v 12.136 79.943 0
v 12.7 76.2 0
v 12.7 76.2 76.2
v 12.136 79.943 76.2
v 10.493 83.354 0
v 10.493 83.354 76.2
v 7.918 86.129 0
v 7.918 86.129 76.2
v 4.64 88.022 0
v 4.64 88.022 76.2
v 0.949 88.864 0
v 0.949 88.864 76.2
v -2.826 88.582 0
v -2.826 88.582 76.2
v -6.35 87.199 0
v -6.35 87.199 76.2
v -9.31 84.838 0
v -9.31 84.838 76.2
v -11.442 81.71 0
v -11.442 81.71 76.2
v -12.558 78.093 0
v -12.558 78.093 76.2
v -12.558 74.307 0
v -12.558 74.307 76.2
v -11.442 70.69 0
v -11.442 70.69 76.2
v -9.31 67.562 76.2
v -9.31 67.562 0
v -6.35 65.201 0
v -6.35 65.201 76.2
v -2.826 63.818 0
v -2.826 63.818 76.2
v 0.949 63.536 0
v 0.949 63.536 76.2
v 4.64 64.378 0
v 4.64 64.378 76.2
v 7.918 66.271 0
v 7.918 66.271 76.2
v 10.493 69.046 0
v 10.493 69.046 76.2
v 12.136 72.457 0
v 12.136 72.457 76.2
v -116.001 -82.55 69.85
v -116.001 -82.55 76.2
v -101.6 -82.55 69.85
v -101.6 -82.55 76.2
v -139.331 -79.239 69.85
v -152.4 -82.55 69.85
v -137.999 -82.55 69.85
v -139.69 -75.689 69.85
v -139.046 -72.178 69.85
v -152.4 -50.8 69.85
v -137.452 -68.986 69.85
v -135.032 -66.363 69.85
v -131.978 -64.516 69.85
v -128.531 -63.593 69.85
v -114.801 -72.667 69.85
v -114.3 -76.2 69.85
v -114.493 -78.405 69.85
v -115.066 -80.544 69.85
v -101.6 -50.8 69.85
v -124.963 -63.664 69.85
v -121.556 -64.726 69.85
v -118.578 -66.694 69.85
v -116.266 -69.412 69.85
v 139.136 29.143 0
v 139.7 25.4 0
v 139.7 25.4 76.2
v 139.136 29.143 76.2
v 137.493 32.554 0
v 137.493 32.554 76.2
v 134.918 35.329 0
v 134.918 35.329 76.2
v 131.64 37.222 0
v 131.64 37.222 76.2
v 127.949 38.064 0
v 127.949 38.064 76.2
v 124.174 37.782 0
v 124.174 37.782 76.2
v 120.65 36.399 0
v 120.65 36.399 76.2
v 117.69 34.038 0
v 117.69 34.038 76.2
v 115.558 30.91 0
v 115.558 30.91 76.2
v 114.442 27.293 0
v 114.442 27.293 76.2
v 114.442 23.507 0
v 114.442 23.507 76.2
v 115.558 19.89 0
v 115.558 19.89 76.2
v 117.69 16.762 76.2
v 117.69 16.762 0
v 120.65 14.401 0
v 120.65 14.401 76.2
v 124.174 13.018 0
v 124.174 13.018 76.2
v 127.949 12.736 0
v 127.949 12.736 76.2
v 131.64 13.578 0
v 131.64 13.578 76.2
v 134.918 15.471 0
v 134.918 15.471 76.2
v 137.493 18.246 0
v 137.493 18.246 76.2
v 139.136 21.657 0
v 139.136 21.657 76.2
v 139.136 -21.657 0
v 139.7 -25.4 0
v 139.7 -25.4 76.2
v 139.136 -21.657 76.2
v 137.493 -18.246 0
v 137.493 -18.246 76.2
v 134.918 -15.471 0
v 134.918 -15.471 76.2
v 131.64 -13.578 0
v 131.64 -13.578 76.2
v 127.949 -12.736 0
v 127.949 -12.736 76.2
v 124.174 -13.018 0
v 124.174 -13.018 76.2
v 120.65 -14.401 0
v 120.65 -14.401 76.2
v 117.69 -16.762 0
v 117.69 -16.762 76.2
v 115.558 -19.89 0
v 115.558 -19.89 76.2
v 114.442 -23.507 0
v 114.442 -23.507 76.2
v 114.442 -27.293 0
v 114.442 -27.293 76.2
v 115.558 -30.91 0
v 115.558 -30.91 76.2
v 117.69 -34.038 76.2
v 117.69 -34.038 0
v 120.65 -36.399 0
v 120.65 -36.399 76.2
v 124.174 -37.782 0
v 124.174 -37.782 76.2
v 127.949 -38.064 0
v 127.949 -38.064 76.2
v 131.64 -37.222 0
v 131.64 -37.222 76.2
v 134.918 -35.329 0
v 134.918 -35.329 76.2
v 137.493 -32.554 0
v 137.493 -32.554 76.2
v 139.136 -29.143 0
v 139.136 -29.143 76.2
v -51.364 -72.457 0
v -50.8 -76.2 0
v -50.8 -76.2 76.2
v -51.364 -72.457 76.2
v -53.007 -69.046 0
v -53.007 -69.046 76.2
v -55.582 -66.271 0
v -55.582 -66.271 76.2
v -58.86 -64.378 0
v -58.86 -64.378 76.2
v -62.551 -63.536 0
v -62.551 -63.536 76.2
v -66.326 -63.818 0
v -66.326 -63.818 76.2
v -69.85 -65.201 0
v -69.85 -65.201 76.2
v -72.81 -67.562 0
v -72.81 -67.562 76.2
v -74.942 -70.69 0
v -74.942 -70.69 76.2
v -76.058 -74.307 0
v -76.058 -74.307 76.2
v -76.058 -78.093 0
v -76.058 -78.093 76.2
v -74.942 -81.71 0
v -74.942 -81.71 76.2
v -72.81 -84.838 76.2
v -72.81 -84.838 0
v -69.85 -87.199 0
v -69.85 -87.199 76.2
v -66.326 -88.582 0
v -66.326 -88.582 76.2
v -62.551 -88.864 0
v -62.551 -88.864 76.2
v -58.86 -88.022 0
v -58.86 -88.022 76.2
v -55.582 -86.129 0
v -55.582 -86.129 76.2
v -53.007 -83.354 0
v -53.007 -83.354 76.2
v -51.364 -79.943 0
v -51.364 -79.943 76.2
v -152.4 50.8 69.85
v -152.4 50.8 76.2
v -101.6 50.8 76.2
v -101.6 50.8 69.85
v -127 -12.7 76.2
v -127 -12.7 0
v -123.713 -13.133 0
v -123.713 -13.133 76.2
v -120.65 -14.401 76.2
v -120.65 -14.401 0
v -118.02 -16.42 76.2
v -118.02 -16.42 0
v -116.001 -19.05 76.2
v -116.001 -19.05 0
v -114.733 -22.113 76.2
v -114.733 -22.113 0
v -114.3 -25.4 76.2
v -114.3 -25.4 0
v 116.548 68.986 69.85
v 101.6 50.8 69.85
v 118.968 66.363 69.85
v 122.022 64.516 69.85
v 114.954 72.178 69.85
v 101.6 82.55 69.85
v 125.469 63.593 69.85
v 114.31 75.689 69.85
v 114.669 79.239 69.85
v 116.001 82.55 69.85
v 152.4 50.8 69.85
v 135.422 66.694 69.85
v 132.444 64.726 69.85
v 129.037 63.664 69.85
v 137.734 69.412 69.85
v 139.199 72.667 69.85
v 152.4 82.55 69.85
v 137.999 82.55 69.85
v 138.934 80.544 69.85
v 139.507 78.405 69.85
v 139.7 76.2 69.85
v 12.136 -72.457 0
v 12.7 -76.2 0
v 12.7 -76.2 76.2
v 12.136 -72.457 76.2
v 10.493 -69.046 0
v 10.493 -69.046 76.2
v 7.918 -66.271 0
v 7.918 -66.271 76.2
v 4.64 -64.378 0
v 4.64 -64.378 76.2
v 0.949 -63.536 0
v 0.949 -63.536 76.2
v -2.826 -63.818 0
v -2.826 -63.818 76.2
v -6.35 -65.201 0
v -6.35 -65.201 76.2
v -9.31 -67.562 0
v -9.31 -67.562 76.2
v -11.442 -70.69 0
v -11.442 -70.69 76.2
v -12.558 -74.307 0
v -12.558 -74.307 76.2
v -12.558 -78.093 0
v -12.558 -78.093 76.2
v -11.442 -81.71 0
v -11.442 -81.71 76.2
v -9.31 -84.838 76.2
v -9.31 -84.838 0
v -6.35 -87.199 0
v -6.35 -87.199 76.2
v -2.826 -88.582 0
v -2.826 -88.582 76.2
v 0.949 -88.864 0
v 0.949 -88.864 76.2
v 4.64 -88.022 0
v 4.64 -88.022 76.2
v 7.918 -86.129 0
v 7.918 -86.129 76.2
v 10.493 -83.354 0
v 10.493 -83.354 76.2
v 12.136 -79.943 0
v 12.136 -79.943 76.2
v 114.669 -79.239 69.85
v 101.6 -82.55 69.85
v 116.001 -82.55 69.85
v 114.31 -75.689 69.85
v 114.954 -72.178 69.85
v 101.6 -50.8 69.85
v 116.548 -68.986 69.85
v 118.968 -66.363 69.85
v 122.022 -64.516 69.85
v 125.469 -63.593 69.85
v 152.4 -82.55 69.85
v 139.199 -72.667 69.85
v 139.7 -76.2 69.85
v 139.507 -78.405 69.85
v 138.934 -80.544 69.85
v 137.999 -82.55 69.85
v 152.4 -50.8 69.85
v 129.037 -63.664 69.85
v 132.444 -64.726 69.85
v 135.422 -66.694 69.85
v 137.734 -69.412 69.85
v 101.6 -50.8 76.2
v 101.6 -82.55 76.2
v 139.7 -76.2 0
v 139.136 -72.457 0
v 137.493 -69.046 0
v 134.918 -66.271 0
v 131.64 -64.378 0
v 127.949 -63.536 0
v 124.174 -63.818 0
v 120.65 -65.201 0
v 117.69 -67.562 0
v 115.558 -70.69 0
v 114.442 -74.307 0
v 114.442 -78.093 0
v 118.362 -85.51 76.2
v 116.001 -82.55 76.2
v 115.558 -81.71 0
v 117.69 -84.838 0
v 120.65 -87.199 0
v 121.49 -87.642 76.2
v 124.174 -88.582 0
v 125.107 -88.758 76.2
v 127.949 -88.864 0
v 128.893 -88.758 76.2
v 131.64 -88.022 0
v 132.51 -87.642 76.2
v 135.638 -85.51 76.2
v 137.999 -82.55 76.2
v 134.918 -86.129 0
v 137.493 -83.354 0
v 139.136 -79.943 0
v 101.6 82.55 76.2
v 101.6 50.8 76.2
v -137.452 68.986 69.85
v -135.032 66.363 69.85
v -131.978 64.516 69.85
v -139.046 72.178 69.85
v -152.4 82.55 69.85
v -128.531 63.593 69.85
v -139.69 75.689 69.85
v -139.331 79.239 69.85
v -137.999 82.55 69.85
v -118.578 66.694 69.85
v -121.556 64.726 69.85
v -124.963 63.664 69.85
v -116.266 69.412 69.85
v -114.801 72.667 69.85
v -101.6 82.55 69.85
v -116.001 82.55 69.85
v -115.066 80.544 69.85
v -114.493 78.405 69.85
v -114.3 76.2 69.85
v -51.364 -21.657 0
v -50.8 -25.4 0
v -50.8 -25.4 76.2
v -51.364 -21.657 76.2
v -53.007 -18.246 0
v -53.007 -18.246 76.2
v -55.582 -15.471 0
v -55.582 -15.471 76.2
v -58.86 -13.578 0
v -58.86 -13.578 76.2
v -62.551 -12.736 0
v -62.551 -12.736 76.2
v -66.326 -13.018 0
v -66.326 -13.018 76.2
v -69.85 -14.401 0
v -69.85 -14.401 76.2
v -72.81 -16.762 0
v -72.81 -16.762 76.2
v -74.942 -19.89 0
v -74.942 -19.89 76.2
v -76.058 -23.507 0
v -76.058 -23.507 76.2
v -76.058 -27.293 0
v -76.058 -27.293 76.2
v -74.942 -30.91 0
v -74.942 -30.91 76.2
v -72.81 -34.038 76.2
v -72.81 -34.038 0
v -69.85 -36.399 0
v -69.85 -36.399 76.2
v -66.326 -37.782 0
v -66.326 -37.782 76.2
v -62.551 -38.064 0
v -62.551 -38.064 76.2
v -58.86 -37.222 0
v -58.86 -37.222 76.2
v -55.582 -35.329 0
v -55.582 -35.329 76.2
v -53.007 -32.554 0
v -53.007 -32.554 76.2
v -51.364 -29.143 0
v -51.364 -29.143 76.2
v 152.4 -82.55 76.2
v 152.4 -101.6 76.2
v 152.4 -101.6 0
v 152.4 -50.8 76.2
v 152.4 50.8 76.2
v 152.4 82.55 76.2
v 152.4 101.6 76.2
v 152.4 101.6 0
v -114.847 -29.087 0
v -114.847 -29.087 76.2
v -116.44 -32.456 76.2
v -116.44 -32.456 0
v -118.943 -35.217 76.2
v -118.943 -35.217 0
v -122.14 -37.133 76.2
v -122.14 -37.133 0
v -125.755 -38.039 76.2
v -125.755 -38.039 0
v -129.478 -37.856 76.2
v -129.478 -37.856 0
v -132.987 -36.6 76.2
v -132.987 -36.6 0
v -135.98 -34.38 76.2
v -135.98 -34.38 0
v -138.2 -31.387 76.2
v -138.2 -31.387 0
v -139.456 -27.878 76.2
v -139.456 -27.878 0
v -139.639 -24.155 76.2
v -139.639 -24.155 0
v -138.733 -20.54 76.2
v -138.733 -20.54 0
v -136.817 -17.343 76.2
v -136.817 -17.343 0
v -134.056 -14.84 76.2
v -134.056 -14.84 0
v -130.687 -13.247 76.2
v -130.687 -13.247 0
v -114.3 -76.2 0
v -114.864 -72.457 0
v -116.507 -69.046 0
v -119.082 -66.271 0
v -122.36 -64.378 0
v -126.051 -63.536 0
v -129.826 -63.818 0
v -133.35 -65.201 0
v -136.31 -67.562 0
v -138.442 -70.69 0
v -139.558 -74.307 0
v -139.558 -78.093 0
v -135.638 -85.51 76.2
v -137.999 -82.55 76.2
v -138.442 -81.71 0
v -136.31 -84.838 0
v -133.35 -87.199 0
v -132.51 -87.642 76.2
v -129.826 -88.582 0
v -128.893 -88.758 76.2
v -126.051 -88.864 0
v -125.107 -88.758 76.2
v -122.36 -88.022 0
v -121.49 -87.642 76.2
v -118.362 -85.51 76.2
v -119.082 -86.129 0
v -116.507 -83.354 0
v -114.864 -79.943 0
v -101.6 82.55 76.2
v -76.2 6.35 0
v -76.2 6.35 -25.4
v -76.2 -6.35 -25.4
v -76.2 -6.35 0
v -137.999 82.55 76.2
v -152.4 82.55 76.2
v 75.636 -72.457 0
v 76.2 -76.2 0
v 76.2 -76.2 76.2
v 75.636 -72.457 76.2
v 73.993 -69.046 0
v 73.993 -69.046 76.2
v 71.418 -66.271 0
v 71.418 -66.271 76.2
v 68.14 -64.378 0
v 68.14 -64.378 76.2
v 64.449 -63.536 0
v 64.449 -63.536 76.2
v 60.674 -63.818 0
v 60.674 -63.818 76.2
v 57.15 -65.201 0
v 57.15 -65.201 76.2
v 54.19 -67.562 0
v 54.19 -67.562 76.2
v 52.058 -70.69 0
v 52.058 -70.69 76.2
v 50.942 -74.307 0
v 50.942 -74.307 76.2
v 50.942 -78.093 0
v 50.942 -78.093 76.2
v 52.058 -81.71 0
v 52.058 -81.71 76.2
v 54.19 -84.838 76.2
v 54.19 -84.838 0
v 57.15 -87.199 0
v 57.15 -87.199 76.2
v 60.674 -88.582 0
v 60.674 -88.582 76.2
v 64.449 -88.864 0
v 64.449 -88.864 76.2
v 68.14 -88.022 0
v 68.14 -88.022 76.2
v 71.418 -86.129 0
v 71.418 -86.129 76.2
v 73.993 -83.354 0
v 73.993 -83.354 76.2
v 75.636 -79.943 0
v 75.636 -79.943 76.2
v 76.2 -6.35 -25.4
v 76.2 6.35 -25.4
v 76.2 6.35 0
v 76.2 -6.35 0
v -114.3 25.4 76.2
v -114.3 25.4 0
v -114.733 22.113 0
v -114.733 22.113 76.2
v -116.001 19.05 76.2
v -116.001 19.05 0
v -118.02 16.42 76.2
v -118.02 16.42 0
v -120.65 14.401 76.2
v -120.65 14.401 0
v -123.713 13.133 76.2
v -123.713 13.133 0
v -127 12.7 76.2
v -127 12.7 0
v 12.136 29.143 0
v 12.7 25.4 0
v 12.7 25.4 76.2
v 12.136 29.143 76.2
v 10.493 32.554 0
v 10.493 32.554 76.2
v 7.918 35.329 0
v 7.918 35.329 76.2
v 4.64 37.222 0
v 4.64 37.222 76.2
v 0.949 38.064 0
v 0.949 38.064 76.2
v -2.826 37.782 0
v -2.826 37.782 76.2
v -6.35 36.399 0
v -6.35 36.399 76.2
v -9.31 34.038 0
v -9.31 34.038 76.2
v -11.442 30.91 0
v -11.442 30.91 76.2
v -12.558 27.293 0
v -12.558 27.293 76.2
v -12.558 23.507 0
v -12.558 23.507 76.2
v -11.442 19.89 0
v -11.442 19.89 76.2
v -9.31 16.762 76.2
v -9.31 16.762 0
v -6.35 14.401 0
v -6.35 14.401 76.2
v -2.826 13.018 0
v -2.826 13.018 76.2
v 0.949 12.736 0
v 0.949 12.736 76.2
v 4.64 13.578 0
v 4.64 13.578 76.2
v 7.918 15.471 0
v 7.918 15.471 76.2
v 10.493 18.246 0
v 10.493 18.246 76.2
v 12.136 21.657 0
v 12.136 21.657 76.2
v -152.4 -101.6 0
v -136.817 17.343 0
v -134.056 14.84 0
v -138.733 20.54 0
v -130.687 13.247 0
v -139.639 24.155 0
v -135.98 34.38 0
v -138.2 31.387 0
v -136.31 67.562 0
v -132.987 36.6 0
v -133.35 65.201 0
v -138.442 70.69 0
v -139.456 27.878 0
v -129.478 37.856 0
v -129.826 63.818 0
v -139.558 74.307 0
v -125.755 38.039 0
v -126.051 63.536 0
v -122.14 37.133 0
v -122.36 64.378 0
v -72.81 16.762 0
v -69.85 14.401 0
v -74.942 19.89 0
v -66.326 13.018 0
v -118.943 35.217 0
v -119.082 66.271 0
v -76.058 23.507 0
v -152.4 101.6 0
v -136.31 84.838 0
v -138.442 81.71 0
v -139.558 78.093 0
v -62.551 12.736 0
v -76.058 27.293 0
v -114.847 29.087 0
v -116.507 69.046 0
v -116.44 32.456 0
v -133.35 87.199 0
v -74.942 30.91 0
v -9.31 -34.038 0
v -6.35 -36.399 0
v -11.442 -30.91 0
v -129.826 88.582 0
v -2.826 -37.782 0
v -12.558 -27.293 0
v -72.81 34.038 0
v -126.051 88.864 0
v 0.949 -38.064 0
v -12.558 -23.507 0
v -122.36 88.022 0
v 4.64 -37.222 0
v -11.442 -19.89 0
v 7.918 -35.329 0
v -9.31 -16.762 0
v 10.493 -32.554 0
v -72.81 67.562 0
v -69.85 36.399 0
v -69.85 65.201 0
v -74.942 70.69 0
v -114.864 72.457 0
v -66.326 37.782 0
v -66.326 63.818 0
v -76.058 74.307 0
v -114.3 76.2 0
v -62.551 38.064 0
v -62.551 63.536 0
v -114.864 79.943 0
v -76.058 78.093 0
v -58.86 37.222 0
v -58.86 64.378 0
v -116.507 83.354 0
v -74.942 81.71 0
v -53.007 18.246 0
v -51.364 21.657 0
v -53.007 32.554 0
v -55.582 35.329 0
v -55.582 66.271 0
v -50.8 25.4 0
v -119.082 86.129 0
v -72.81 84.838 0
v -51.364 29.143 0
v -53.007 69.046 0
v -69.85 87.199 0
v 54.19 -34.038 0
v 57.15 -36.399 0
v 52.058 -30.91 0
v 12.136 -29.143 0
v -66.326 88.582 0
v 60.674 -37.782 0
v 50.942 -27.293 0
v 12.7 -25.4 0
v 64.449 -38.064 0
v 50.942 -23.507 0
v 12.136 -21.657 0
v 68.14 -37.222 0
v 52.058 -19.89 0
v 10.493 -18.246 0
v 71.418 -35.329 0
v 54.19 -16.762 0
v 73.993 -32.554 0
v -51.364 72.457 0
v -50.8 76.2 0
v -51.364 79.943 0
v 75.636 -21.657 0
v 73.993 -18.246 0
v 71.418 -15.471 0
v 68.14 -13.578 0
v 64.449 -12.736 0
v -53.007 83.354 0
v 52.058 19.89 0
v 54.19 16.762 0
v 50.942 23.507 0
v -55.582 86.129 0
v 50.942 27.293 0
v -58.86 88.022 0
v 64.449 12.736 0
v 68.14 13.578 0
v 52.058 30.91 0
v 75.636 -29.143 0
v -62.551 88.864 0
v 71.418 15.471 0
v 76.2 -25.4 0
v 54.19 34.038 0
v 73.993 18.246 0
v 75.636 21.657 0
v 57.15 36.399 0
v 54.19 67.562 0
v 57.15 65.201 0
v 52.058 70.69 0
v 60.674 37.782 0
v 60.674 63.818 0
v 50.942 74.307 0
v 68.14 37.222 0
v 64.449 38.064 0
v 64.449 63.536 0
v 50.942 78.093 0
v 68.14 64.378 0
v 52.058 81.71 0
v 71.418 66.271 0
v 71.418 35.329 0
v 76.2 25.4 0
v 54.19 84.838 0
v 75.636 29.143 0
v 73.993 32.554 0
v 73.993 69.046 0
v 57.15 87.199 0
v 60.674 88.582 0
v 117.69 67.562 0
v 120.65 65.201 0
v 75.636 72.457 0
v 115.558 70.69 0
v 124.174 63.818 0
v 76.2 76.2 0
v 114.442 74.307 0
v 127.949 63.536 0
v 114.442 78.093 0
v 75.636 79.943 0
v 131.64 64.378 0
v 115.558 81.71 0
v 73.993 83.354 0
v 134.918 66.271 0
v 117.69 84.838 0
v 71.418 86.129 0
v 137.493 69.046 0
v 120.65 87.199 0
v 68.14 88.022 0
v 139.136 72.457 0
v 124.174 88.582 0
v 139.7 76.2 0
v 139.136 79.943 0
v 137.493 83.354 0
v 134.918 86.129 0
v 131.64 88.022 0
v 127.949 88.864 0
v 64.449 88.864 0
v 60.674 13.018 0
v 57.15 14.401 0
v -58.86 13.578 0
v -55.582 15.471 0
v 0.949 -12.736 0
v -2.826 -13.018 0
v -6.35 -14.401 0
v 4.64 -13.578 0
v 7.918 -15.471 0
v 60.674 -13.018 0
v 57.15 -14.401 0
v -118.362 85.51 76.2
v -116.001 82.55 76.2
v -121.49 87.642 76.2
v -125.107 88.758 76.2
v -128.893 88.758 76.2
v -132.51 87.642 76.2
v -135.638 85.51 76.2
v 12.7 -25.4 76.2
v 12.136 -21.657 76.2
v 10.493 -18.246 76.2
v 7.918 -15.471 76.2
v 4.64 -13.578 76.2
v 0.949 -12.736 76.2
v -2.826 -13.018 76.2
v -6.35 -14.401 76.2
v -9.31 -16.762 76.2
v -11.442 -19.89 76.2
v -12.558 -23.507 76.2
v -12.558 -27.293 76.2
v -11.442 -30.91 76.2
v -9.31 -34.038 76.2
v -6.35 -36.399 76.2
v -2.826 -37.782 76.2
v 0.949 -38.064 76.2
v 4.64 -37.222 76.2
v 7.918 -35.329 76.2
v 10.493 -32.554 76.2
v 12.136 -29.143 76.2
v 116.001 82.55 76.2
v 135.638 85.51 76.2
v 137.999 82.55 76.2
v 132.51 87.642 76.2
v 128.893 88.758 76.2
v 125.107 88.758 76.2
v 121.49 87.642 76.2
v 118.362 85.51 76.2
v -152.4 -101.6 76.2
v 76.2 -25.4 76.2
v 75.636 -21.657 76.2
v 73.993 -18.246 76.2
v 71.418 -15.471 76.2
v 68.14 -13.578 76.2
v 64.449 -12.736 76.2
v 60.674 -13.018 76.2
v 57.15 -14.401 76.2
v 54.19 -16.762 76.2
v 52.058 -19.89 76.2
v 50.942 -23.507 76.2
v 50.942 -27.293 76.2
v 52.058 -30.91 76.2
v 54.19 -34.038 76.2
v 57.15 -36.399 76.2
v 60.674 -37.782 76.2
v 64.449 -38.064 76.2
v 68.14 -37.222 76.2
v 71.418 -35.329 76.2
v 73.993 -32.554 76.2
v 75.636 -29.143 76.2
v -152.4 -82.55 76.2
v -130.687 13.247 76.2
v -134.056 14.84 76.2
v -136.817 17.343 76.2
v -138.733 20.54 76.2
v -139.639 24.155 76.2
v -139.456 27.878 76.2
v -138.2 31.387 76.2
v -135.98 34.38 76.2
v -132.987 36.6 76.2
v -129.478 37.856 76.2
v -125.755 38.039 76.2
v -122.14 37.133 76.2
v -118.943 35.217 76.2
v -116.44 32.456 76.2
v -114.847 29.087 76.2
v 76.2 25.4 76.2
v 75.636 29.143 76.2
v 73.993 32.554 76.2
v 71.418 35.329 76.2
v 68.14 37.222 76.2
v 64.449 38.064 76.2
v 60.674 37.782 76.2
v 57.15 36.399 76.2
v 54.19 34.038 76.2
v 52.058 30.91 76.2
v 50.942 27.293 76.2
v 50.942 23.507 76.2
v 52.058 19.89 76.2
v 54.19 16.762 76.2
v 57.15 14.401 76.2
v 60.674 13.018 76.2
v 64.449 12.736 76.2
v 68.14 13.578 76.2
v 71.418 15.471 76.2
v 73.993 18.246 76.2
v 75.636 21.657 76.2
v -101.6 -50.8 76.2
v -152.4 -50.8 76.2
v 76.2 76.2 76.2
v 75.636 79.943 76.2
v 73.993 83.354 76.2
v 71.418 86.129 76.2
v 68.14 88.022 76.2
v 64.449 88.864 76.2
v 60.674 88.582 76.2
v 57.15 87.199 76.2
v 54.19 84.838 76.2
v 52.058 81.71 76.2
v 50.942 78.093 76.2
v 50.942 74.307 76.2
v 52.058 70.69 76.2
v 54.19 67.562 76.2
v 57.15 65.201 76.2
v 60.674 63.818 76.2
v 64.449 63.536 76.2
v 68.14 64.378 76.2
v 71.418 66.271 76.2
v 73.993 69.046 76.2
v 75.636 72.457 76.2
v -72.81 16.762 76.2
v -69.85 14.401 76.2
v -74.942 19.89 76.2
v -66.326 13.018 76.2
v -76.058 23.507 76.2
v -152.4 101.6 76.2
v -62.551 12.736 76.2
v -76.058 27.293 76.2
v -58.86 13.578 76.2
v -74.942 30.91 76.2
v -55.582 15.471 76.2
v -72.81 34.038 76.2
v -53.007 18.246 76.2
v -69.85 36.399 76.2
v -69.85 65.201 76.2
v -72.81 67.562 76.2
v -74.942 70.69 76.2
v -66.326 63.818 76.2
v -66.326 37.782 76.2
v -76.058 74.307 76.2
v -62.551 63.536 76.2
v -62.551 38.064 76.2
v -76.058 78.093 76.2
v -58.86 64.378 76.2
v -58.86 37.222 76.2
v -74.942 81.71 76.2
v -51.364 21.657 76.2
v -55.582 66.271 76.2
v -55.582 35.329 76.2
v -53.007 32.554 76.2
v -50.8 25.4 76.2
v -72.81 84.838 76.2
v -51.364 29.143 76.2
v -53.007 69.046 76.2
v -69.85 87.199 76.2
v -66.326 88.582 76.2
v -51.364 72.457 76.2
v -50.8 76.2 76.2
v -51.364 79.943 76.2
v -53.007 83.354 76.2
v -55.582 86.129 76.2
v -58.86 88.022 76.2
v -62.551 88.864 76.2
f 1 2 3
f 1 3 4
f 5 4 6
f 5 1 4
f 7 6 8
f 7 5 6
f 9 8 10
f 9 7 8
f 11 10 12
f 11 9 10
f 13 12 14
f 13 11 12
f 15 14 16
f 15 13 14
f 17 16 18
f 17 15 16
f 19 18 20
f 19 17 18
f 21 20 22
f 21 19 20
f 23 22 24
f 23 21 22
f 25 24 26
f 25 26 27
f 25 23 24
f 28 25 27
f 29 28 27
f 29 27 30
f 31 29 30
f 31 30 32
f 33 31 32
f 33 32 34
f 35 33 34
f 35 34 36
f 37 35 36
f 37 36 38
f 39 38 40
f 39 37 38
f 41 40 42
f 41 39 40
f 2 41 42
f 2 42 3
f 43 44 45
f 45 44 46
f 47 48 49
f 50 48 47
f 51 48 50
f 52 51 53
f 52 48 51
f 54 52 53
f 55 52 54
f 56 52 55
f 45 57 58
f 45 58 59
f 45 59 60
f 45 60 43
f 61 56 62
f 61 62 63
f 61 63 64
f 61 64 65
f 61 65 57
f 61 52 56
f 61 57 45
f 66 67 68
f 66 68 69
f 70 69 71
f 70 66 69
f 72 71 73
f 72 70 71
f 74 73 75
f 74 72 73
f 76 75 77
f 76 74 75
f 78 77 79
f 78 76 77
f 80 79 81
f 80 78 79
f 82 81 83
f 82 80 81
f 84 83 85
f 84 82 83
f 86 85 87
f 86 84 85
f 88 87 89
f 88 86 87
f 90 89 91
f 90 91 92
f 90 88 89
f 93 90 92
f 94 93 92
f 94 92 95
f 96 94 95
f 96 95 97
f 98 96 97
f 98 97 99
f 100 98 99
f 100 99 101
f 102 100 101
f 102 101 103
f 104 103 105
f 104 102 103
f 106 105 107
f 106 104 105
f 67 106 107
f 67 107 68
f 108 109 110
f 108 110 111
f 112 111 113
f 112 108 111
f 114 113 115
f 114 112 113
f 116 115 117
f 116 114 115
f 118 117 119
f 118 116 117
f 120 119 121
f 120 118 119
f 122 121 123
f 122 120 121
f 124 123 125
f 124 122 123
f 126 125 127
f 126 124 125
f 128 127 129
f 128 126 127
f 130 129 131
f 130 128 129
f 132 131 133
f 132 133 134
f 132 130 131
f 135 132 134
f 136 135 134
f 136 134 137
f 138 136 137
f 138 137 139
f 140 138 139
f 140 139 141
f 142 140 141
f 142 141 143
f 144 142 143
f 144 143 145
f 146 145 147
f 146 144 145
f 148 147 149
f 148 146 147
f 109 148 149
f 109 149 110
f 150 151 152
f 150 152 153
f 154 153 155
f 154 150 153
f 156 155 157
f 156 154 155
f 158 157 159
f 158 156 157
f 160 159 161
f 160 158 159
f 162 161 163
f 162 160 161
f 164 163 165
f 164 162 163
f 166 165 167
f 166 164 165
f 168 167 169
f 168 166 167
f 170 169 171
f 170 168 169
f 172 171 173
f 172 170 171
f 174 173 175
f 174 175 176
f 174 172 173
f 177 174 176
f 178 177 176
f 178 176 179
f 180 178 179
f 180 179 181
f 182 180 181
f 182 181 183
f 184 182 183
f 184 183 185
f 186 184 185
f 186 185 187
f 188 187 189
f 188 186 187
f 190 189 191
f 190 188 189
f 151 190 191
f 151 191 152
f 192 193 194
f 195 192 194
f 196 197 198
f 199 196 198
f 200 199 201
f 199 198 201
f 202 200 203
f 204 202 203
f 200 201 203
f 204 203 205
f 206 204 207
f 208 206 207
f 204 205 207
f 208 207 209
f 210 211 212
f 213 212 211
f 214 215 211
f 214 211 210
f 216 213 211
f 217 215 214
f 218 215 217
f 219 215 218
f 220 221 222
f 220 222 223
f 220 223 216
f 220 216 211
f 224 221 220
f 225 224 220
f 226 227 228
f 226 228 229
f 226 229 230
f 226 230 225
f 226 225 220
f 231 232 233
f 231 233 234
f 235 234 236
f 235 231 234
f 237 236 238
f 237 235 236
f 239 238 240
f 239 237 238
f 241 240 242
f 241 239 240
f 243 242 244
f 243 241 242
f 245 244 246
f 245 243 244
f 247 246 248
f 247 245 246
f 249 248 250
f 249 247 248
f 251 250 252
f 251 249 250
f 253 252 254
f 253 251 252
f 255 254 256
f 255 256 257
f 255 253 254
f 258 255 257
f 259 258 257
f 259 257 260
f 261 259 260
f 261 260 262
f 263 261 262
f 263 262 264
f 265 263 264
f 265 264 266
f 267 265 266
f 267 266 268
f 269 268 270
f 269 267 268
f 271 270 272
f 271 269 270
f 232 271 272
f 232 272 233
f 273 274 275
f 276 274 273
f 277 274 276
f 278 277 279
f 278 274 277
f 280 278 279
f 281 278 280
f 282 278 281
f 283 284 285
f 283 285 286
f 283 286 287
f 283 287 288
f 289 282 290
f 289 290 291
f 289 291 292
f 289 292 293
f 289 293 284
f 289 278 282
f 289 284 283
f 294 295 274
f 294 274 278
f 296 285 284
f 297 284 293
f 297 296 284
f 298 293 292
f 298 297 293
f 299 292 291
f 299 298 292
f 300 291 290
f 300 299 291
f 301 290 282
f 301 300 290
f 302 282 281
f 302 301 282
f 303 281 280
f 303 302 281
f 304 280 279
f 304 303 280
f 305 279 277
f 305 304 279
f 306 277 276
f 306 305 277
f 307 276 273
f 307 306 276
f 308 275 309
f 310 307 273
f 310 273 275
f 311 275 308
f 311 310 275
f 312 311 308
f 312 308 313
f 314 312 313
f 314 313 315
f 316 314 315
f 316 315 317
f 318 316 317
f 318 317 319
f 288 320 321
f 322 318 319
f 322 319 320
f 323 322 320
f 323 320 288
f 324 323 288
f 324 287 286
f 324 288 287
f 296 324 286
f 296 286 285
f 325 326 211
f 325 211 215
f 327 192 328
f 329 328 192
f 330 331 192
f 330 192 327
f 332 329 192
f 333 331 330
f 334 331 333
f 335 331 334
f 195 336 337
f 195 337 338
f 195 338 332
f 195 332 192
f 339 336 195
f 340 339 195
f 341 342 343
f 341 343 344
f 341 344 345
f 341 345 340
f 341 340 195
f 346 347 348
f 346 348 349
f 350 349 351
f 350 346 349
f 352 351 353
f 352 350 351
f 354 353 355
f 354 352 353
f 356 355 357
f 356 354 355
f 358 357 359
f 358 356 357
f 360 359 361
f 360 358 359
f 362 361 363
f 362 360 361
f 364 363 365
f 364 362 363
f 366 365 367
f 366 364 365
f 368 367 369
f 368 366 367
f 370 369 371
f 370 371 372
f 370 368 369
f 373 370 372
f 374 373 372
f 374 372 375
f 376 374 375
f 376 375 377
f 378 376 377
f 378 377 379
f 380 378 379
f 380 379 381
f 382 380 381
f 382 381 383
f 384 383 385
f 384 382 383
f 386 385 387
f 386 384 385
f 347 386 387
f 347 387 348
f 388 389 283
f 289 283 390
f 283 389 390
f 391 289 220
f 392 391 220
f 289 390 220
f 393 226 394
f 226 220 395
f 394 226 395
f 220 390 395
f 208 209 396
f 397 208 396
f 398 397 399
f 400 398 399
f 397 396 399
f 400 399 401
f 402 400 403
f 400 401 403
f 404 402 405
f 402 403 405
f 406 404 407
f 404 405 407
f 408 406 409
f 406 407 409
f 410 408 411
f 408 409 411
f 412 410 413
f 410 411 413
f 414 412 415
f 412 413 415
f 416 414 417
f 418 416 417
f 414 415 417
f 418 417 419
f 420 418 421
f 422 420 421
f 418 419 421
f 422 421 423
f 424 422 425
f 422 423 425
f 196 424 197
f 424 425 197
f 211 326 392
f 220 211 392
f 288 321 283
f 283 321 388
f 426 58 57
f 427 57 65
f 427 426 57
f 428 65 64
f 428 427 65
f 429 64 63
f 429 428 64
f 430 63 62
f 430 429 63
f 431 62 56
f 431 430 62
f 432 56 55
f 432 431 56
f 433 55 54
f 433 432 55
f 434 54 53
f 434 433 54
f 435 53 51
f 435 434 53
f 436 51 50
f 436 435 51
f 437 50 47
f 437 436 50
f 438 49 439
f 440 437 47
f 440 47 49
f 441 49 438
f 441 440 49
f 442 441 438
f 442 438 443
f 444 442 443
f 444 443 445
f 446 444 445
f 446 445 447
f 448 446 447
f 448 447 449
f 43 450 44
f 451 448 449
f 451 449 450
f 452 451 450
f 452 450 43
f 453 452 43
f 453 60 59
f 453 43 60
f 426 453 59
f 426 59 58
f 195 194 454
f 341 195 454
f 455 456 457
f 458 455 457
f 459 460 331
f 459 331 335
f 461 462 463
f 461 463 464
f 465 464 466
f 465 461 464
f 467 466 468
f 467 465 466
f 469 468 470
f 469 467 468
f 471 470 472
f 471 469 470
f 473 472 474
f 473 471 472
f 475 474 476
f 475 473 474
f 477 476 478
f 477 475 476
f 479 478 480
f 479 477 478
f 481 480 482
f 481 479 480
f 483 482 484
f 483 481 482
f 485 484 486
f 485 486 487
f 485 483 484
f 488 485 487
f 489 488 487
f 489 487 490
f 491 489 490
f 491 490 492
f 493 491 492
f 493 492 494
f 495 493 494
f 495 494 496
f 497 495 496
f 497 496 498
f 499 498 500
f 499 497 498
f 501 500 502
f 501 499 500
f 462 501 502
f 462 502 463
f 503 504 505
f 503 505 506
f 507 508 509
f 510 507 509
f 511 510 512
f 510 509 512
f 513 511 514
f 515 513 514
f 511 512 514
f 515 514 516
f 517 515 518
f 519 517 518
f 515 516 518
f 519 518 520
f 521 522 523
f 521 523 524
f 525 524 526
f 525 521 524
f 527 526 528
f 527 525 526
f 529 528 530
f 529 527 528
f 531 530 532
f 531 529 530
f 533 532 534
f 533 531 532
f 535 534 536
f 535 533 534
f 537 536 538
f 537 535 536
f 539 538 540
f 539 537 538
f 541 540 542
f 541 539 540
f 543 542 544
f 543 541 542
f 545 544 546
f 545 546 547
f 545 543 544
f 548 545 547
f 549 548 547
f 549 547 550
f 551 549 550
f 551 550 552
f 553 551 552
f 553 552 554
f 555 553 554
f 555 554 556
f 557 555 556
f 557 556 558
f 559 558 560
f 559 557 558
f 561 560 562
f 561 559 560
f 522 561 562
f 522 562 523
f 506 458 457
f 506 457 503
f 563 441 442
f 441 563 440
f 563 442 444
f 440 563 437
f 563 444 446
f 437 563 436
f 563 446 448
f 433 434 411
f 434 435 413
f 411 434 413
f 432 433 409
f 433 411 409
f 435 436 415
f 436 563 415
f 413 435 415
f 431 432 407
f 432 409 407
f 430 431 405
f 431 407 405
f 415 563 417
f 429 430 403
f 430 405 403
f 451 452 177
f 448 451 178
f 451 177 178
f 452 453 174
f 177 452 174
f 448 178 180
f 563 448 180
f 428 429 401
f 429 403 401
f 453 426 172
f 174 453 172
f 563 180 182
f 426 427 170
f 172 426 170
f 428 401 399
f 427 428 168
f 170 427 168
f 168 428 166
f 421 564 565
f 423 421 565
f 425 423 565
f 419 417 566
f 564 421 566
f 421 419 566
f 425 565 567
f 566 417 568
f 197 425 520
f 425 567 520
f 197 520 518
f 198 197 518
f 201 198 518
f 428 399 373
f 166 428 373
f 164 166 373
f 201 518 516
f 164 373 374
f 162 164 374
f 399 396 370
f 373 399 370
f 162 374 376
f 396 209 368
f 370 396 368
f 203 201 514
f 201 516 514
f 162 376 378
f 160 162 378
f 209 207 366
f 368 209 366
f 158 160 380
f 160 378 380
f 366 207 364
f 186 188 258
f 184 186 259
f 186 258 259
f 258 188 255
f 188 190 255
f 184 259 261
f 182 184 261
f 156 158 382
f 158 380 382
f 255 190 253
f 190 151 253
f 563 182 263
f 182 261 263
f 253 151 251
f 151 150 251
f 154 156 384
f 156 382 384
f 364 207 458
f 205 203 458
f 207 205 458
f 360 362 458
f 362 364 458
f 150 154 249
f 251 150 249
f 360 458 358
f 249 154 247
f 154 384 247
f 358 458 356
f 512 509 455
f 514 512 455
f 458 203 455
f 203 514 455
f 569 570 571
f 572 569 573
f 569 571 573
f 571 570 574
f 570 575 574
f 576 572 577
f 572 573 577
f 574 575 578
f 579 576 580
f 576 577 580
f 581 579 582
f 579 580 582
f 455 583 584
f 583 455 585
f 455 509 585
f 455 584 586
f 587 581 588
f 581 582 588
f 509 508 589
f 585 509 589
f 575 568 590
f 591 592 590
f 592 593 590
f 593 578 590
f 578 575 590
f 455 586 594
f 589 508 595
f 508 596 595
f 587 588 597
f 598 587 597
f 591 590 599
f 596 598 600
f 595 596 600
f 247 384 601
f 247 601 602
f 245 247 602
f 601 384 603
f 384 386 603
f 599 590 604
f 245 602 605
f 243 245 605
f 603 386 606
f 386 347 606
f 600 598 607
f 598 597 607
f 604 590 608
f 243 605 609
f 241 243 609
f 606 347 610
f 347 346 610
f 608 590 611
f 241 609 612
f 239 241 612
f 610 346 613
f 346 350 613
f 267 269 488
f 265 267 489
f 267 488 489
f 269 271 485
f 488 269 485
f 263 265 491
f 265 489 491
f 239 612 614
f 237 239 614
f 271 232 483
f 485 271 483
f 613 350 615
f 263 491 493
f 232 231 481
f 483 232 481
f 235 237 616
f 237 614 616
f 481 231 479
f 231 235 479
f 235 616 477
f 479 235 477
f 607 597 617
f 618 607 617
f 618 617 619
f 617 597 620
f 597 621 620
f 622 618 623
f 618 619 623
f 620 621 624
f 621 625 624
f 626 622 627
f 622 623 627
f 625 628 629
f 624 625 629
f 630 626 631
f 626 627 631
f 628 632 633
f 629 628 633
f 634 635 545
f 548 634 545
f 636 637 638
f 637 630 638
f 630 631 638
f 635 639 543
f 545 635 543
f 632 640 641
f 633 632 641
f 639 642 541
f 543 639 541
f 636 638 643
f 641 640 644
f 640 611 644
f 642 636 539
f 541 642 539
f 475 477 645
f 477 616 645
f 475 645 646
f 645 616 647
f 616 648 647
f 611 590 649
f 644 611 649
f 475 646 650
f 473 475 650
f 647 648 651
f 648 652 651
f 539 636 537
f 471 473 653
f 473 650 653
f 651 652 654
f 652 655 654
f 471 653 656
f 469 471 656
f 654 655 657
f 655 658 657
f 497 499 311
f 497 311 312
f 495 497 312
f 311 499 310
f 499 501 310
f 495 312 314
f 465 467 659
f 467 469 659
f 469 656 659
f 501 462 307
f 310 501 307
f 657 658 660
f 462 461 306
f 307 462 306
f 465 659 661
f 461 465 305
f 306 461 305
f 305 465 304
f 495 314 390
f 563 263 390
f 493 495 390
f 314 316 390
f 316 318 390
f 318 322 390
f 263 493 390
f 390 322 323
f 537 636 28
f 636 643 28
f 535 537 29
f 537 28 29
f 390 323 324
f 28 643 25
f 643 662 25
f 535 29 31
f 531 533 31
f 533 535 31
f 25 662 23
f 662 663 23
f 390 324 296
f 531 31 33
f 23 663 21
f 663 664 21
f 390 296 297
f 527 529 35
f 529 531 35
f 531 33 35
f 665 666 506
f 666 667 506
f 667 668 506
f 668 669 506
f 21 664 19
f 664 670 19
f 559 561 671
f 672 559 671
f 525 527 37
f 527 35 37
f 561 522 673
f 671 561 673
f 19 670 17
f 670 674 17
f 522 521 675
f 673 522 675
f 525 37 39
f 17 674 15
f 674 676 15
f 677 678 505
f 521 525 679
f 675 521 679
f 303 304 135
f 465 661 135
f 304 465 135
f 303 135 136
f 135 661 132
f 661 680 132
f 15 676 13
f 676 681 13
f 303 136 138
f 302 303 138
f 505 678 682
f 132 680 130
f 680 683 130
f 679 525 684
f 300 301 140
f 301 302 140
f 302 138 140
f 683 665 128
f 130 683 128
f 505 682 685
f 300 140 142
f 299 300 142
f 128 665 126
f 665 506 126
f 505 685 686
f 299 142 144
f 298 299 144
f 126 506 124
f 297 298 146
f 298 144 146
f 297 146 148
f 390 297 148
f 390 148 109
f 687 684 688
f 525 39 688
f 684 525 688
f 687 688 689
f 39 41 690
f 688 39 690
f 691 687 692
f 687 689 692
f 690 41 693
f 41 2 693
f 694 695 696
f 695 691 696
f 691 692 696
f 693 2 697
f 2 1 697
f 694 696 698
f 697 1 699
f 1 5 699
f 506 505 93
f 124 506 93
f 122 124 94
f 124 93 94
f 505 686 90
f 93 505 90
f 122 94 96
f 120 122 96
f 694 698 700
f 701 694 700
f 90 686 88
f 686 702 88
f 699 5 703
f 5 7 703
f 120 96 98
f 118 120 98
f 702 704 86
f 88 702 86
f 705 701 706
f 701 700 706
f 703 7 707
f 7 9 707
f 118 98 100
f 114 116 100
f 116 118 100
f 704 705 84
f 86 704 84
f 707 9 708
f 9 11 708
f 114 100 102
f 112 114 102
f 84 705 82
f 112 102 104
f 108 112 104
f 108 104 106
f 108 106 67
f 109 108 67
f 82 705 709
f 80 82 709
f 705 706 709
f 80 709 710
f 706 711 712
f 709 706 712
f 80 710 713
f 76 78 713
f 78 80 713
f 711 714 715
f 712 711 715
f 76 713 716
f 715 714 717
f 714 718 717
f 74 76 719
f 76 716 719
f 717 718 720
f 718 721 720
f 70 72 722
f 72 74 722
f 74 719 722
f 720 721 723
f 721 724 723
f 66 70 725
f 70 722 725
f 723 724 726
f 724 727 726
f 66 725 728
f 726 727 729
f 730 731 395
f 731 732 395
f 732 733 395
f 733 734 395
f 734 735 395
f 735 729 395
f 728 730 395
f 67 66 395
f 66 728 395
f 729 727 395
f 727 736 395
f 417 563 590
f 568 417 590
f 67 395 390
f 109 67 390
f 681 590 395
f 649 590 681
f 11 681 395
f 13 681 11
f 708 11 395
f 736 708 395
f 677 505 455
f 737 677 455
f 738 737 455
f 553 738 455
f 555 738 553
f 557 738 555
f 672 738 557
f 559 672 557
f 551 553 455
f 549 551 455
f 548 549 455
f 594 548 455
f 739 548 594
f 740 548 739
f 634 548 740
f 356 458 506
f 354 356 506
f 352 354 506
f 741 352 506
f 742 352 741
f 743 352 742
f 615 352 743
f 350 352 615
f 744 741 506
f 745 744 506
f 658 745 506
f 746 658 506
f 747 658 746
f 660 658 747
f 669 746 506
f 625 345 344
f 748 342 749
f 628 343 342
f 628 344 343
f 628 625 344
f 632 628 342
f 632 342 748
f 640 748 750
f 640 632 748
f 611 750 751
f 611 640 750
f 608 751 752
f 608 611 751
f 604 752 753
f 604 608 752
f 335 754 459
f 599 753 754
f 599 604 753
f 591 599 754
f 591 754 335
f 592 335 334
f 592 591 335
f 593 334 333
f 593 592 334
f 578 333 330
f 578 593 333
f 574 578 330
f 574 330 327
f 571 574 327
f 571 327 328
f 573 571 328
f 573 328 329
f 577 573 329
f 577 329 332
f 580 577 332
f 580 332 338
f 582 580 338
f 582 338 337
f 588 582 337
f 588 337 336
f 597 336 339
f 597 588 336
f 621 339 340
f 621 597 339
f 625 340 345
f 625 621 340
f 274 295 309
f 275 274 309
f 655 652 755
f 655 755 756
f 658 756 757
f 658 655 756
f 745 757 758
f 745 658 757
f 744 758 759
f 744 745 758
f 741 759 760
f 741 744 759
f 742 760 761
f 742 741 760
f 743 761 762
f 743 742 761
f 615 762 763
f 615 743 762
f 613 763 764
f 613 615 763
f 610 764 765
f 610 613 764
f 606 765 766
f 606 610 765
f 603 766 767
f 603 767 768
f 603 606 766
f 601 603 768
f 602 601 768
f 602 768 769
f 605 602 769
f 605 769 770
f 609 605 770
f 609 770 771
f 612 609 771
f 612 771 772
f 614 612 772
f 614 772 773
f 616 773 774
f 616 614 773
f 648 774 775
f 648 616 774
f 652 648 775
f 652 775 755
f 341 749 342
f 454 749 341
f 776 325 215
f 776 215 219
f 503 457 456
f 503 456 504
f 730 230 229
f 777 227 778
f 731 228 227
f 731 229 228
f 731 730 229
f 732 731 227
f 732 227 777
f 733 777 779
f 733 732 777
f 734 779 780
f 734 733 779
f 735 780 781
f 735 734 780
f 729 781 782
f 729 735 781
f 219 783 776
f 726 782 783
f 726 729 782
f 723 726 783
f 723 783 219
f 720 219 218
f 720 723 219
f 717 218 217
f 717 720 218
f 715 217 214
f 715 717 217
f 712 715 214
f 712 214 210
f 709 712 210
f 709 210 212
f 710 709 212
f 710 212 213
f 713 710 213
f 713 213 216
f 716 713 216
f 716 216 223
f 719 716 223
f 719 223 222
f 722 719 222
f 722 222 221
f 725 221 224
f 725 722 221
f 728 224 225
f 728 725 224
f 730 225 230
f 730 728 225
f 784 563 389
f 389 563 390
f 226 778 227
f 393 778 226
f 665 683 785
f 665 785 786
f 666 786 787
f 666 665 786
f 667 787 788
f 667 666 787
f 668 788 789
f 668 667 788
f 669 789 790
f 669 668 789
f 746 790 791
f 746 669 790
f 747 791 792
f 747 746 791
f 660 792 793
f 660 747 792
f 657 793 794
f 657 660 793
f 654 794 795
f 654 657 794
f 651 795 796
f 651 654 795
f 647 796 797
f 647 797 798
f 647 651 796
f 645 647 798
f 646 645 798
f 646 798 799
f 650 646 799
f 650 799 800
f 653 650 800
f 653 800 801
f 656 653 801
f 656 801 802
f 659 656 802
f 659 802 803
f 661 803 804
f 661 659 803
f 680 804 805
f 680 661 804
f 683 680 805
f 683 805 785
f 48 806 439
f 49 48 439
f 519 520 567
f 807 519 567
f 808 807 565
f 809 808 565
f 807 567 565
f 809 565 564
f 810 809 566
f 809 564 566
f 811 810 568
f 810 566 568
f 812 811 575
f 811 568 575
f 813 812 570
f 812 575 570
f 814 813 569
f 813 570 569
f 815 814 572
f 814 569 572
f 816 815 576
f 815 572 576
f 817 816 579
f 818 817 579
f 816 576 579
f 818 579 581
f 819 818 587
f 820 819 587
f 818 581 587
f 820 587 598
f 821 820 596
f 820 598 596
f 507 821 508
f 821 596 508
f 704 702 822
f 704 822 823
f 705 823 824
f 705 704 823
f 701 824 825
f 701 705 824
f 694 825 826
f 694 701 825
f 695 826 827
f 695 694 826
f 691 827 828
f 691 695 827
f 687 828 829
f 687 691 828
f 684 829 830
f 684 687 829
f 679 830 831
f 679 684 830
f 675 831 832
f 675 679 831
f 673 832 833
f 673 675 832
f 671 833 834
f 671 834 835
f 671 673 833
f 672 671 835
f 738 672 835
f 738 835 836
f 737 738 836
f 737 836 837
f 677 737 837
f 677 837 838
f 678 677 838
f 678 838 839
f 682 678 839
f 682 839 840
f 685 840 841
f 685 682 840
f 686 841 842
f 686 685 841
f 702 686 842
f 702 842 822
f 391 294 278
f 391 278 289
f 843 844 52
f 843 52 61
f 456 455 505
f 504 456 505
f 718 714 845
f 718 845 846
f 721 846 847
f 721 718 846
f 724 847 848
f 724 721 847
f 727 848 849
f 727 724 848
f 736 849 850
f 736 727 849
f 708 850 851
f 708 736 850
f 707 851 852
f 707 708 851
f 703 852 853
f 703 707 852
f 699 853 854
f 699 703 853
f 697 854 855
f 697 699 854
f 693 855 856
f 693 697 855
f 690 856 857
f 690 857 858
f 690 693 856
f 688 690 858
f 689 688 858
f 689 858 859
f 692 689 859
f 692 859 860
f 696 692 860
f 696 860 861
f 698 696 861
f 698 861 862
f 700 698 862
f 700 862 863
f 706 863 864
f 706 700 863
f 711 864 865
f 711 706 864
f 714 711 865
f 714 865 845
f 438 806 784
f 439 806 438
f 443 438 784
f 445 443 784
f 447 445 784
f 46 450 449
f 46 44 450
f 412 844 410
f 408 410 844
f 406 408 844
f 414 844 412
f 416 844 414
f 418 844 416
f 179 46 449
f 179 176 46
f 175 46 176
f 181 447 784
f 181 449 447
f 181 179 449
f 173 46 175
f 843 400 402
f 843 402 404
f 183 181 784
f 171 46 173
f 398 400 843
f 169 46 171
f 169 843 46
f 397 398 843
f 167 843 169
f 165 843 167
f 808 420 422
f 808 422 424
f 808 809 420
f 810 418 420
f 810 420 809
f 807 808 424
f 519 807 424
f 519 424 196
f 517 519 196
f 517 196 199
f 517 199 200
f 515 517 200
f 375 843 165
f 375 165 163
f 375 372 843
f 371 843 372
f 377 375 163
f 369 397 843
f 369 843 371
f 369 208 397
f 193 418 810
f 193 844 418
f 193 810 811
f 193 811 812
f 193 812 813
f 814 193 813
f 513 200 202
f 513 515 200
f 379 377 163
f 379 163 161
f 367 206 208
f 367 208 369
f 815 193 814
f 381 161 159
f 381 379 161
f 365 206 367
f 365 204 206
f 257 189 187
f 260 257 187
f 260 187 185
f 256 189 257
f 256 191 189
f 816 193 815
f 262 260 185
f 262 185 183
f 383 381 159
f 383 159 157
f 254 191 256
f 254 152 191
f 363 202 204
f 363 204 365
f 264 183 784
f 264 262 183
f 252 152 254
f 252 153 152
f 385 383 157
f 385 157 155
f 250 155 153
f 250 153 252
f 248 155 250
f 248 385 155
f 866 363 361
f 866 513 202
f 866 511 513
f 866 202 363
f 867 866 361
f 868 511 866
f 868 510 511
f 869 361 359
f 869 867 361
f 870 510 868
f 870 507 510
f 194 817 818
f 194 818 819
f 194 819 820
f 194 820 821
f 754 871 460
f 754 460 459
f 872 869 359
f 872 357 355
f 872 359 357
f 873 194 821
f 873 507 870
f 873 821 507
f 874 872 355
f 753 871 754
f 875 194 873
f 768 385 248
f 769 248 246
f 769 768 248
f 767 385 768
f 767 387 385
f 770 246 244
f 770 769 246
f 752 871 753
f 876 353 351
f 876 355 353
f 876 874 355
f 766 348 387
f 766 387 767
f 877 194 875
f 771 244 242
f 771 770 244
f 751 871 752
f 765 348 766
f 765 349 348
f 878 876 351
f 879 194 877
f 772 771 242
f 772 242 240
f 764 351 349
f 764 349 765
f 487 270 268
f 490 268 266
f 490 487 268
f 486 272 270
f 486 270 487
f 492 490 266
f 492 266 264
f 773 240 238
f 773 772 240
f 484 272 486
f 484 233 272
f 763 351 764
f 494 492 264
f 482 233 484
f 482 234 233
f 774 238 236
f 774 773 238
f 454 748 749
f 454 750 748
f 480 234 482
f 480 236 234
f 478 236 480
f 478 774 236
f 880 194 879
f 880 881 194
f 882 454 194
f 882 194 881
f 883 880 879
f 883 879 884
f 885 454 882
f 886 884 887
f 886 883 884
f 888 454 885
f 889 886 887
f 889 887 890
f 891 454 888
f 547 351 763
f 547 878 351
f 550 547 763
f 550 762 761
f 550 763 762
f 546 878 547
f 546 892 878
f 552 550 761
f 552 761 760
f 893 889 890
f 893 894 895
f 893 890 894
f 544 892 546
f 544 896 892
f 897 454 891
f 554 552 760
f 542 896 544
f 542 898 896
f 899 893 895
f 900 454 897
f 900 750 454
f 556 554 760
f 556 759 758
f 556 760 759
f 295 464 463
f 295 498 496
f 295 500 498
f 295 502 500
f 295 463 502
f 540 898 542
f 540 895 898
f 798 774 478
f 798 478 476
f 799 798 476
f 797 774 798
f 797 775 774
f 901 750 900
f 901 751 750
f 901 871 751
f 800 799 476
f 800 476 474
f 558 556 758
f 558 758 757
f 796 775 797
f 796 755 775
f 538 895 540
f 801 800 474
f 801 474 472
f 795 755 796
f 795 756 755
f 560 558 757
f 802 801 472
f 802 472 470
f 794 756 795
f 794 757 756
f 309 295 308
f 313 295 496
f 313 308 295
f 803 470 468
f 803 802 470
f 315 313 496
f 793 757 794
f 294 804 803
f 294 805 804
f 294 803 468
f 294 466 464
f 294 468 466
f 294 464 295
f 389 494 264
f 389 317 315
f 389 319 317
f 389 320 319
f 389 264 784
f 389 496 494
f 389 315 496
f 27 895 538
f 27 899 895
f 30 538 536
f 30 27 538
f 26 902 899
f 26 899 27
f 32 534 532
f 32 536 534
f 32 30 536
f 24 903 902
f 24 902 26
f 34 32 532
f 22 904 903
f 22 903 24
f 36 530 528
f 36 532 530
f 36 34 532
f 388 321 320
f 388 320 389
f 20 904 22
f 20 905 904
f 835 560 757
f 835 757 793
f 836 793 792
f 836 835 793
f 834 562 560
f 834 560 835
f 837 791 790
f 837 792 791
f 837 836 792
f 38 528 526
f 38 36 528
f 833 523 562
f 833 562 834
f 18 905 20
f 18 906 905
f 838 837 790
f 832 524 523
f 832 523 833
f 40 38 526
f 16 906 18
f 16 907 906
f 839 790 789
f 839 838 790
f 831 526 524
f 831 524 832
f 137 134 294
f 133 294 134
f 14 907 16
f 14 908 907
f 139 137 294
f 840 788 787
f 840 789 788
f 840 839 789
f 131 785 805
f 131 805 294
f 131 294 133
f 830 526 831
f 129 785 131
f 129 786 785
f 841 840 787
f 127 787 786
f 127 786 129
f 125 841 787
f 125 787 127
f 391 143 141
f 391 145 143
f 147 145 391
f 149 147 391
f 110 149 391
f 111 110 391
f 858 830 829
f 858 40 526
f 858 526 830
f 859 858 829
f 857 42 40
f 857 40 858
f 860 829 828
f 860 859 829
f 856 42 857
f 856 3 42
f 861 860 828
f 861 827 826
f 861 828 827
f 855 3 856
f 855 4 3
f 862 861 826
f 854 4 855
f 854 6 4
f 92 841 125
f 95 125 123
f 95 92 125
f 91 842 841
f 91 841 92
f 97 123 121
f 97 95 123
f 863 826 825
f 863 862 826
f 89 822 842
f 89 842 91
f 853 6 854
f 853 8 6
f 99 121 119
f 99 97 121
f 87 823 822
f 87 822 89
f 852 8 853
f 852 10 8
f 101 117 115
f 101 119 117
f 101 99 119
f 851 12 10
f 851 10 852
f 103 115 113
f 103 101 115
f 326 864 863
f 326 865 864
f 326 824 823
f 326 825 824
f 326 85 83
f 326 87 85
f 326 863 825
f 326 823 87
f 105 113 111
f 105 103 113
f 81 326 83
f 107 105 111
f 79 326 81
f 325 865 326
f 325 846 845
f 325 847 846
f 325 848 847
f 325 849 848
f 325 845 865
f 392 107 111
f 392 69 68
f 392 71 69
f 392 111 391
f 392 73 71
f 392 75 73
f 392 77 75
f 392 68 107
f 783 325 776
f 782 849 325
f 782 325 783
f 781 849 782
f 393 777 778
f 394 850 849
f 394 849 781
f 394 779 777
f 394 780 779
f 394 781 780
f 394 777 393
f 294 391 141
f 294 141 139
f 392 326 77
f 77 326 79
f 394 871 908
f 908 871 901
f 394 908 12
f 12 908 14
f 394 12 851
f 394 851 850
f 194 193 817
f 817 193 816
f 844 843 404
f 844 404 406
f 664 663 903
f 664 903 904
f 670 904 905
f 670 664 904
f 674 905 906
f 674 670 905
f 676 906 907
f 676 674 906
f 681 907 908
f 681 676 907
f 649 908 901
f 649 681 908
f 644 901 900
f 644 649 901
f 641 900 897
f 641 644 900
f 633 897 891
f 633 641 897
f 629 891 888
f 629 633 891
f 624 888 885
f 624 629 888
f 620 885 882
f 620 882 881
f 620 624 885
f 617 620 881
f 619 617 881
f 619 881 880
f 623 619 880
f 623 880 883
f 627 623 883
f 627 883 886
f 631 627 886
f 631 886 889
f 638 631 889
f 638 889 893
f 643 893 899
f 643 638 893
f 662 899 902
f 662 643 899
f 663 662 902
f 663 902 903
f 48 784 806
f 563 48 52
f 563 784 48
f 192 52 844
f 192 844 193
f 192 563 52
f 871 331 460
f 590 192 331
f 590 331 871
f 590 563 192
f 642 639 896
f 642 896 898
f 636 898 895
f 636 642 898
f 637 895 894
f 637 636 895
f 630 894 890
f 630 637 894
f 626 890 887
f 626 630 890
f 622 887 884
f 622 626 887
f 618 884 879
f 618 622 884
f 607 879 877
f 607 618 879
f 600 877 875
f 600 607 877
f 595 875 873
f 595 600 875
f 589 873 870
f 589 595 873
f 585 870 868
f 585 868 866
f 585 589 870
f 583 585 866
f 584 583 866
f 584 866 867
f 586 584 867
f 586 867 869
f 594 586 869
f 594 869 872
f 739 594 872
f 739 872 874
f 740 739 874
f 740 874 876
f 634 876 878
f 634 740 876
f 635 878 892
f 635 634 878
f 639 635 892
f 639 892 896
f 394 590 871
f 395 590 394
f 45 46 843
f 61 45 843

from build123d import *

# Parameters (mm, degrees)
F0_W     = 304.8
F0_H     = 203.2
F0_R     = 12.7
F1_DEPTH = 76.2
F2_W     = 152.4
F2_H     = 12.7
F3_DEPTH = 25.4
F4_W     = 50.8
F4_H     = 31.75
F5_DEPTH = 6.35


with BuildPart() as f1:
    # F0 (on Top) → F1 (new body)
    with BuildSketch(Plane.XY):
        Rectangle(F0_W, F0_H)
        with Locations((-127, -76.2)):
            Circle(F0_R, mode=Mode.SUBTRACT)
        with Locations((-63.5, -76.2)):
            Circle(F0_R, mode=Mode.SUBTRACT)
        with BuildLine():
            ThreePointArc((-127, -12.7), (-118.0197438789, -16.4197438789), (-114.3, -25.4))
            ThreePointArc((-114.3, -25.4), (-135.9802561211, -34.3802561211), (-127, -12.7))
        make_face(mode=Mode.SUBTRACT)
        with Locations((-63.5, -25.4)):
            Circle(F0_R, mode=Mode.SUBTRACT)
        with Locations((0, -76.2)):
            Circle(F0_R, mode=Mode.SUBTRACT)
        with Locations((63.5, -76.2)):
            Circle(F0_R, mode=Mode.SUBTRACT)
        with Locations((127, -76.2)):
            Circle(F0_R, mode=Mode.SUBTRACT)
        with Locations((0, -25.4)):
            Circle(F0_R, mode=Mode.SUBTRACT)
        with Locations((63.5, -25.4)):
            Circle(F0_R, mode=Mode.SUBTRACT)
        with Locations((127, -25.4)):
            Circle(F0_R, mode=Mode.SUBTRACT)
        with BuildLine():
            ThreePointArc((-114.3, 25.4), (-118.0197438789, 16.4197438789), (-127, 12.7))
            ThreePointArc((-127, 12.7), (-135.9802561211, 34.3802561211), (-114.3, 25.4))
        make_face(mode=Mode.SUBTRACT)
        with Locations((-63.5, 25.4)):
            Circle(F0_R, mode=Mode.SUBTRACT)
        with Locations((-127, 76.2)):
            Circle(F0_R, mode=Mode.SUBTRACT)
        with Locations((-63.5, 76.2)):
            Circle(F0_R, mode=Mode.SUBTRACT)
        with Locations((0, 25.4)):
            Circle(F0_R, mode=Mode.SUBTRACT)
        with Locations((63.5, 25.4)):
            Circle(F0_R, mode=Mode.SUBTRACT)
        with Locations((127, 25.4)):
            Circle(F0_R, mode=Mode.SUBTRACT)
        with Locations((0, 76.2)):
            Circle(F0_R, mode=Mode.SUBTRACT)
        with Locations((63.5, 76.2)):
            Circle(F0_R, mode=Mode.SUBTRACT)
        with Locations((127, 76.2)):
            Circle(F0_R, mode=Mode.SUBTRACT)
    extrude(amount=F1_DEPTH)

    # F2 (on face) → F3 (join)
    with BuildSketch(Plane(origin=(0, 0, 0), x_dir=(1, 0, 0), z_dir=(0, 0, -1))):
        Rectangle(F2_W, F2_H)
    extrude(amount=F3_DEPTH)

    # F4 (on face) → F5 (cut)
    with BuildSketch(Plane.XY.offset(76.2)):
        with Locations((-127, 66.675)):
            Rectangle(F4_W, F4_H)
        with Locations((-127, -66.675)):
            Rectangle(F4_W, F4_H)
        with Locations((127, 66.675)):
            Rectangle(F4_W, F4_H)
        with Locations((127, -66.675)):
            Rectangle(F4_W, F4_H)
    extrude(amount=-F5_DEPTH, mode=Mode.SUBTRACT)


solid = f1.part
